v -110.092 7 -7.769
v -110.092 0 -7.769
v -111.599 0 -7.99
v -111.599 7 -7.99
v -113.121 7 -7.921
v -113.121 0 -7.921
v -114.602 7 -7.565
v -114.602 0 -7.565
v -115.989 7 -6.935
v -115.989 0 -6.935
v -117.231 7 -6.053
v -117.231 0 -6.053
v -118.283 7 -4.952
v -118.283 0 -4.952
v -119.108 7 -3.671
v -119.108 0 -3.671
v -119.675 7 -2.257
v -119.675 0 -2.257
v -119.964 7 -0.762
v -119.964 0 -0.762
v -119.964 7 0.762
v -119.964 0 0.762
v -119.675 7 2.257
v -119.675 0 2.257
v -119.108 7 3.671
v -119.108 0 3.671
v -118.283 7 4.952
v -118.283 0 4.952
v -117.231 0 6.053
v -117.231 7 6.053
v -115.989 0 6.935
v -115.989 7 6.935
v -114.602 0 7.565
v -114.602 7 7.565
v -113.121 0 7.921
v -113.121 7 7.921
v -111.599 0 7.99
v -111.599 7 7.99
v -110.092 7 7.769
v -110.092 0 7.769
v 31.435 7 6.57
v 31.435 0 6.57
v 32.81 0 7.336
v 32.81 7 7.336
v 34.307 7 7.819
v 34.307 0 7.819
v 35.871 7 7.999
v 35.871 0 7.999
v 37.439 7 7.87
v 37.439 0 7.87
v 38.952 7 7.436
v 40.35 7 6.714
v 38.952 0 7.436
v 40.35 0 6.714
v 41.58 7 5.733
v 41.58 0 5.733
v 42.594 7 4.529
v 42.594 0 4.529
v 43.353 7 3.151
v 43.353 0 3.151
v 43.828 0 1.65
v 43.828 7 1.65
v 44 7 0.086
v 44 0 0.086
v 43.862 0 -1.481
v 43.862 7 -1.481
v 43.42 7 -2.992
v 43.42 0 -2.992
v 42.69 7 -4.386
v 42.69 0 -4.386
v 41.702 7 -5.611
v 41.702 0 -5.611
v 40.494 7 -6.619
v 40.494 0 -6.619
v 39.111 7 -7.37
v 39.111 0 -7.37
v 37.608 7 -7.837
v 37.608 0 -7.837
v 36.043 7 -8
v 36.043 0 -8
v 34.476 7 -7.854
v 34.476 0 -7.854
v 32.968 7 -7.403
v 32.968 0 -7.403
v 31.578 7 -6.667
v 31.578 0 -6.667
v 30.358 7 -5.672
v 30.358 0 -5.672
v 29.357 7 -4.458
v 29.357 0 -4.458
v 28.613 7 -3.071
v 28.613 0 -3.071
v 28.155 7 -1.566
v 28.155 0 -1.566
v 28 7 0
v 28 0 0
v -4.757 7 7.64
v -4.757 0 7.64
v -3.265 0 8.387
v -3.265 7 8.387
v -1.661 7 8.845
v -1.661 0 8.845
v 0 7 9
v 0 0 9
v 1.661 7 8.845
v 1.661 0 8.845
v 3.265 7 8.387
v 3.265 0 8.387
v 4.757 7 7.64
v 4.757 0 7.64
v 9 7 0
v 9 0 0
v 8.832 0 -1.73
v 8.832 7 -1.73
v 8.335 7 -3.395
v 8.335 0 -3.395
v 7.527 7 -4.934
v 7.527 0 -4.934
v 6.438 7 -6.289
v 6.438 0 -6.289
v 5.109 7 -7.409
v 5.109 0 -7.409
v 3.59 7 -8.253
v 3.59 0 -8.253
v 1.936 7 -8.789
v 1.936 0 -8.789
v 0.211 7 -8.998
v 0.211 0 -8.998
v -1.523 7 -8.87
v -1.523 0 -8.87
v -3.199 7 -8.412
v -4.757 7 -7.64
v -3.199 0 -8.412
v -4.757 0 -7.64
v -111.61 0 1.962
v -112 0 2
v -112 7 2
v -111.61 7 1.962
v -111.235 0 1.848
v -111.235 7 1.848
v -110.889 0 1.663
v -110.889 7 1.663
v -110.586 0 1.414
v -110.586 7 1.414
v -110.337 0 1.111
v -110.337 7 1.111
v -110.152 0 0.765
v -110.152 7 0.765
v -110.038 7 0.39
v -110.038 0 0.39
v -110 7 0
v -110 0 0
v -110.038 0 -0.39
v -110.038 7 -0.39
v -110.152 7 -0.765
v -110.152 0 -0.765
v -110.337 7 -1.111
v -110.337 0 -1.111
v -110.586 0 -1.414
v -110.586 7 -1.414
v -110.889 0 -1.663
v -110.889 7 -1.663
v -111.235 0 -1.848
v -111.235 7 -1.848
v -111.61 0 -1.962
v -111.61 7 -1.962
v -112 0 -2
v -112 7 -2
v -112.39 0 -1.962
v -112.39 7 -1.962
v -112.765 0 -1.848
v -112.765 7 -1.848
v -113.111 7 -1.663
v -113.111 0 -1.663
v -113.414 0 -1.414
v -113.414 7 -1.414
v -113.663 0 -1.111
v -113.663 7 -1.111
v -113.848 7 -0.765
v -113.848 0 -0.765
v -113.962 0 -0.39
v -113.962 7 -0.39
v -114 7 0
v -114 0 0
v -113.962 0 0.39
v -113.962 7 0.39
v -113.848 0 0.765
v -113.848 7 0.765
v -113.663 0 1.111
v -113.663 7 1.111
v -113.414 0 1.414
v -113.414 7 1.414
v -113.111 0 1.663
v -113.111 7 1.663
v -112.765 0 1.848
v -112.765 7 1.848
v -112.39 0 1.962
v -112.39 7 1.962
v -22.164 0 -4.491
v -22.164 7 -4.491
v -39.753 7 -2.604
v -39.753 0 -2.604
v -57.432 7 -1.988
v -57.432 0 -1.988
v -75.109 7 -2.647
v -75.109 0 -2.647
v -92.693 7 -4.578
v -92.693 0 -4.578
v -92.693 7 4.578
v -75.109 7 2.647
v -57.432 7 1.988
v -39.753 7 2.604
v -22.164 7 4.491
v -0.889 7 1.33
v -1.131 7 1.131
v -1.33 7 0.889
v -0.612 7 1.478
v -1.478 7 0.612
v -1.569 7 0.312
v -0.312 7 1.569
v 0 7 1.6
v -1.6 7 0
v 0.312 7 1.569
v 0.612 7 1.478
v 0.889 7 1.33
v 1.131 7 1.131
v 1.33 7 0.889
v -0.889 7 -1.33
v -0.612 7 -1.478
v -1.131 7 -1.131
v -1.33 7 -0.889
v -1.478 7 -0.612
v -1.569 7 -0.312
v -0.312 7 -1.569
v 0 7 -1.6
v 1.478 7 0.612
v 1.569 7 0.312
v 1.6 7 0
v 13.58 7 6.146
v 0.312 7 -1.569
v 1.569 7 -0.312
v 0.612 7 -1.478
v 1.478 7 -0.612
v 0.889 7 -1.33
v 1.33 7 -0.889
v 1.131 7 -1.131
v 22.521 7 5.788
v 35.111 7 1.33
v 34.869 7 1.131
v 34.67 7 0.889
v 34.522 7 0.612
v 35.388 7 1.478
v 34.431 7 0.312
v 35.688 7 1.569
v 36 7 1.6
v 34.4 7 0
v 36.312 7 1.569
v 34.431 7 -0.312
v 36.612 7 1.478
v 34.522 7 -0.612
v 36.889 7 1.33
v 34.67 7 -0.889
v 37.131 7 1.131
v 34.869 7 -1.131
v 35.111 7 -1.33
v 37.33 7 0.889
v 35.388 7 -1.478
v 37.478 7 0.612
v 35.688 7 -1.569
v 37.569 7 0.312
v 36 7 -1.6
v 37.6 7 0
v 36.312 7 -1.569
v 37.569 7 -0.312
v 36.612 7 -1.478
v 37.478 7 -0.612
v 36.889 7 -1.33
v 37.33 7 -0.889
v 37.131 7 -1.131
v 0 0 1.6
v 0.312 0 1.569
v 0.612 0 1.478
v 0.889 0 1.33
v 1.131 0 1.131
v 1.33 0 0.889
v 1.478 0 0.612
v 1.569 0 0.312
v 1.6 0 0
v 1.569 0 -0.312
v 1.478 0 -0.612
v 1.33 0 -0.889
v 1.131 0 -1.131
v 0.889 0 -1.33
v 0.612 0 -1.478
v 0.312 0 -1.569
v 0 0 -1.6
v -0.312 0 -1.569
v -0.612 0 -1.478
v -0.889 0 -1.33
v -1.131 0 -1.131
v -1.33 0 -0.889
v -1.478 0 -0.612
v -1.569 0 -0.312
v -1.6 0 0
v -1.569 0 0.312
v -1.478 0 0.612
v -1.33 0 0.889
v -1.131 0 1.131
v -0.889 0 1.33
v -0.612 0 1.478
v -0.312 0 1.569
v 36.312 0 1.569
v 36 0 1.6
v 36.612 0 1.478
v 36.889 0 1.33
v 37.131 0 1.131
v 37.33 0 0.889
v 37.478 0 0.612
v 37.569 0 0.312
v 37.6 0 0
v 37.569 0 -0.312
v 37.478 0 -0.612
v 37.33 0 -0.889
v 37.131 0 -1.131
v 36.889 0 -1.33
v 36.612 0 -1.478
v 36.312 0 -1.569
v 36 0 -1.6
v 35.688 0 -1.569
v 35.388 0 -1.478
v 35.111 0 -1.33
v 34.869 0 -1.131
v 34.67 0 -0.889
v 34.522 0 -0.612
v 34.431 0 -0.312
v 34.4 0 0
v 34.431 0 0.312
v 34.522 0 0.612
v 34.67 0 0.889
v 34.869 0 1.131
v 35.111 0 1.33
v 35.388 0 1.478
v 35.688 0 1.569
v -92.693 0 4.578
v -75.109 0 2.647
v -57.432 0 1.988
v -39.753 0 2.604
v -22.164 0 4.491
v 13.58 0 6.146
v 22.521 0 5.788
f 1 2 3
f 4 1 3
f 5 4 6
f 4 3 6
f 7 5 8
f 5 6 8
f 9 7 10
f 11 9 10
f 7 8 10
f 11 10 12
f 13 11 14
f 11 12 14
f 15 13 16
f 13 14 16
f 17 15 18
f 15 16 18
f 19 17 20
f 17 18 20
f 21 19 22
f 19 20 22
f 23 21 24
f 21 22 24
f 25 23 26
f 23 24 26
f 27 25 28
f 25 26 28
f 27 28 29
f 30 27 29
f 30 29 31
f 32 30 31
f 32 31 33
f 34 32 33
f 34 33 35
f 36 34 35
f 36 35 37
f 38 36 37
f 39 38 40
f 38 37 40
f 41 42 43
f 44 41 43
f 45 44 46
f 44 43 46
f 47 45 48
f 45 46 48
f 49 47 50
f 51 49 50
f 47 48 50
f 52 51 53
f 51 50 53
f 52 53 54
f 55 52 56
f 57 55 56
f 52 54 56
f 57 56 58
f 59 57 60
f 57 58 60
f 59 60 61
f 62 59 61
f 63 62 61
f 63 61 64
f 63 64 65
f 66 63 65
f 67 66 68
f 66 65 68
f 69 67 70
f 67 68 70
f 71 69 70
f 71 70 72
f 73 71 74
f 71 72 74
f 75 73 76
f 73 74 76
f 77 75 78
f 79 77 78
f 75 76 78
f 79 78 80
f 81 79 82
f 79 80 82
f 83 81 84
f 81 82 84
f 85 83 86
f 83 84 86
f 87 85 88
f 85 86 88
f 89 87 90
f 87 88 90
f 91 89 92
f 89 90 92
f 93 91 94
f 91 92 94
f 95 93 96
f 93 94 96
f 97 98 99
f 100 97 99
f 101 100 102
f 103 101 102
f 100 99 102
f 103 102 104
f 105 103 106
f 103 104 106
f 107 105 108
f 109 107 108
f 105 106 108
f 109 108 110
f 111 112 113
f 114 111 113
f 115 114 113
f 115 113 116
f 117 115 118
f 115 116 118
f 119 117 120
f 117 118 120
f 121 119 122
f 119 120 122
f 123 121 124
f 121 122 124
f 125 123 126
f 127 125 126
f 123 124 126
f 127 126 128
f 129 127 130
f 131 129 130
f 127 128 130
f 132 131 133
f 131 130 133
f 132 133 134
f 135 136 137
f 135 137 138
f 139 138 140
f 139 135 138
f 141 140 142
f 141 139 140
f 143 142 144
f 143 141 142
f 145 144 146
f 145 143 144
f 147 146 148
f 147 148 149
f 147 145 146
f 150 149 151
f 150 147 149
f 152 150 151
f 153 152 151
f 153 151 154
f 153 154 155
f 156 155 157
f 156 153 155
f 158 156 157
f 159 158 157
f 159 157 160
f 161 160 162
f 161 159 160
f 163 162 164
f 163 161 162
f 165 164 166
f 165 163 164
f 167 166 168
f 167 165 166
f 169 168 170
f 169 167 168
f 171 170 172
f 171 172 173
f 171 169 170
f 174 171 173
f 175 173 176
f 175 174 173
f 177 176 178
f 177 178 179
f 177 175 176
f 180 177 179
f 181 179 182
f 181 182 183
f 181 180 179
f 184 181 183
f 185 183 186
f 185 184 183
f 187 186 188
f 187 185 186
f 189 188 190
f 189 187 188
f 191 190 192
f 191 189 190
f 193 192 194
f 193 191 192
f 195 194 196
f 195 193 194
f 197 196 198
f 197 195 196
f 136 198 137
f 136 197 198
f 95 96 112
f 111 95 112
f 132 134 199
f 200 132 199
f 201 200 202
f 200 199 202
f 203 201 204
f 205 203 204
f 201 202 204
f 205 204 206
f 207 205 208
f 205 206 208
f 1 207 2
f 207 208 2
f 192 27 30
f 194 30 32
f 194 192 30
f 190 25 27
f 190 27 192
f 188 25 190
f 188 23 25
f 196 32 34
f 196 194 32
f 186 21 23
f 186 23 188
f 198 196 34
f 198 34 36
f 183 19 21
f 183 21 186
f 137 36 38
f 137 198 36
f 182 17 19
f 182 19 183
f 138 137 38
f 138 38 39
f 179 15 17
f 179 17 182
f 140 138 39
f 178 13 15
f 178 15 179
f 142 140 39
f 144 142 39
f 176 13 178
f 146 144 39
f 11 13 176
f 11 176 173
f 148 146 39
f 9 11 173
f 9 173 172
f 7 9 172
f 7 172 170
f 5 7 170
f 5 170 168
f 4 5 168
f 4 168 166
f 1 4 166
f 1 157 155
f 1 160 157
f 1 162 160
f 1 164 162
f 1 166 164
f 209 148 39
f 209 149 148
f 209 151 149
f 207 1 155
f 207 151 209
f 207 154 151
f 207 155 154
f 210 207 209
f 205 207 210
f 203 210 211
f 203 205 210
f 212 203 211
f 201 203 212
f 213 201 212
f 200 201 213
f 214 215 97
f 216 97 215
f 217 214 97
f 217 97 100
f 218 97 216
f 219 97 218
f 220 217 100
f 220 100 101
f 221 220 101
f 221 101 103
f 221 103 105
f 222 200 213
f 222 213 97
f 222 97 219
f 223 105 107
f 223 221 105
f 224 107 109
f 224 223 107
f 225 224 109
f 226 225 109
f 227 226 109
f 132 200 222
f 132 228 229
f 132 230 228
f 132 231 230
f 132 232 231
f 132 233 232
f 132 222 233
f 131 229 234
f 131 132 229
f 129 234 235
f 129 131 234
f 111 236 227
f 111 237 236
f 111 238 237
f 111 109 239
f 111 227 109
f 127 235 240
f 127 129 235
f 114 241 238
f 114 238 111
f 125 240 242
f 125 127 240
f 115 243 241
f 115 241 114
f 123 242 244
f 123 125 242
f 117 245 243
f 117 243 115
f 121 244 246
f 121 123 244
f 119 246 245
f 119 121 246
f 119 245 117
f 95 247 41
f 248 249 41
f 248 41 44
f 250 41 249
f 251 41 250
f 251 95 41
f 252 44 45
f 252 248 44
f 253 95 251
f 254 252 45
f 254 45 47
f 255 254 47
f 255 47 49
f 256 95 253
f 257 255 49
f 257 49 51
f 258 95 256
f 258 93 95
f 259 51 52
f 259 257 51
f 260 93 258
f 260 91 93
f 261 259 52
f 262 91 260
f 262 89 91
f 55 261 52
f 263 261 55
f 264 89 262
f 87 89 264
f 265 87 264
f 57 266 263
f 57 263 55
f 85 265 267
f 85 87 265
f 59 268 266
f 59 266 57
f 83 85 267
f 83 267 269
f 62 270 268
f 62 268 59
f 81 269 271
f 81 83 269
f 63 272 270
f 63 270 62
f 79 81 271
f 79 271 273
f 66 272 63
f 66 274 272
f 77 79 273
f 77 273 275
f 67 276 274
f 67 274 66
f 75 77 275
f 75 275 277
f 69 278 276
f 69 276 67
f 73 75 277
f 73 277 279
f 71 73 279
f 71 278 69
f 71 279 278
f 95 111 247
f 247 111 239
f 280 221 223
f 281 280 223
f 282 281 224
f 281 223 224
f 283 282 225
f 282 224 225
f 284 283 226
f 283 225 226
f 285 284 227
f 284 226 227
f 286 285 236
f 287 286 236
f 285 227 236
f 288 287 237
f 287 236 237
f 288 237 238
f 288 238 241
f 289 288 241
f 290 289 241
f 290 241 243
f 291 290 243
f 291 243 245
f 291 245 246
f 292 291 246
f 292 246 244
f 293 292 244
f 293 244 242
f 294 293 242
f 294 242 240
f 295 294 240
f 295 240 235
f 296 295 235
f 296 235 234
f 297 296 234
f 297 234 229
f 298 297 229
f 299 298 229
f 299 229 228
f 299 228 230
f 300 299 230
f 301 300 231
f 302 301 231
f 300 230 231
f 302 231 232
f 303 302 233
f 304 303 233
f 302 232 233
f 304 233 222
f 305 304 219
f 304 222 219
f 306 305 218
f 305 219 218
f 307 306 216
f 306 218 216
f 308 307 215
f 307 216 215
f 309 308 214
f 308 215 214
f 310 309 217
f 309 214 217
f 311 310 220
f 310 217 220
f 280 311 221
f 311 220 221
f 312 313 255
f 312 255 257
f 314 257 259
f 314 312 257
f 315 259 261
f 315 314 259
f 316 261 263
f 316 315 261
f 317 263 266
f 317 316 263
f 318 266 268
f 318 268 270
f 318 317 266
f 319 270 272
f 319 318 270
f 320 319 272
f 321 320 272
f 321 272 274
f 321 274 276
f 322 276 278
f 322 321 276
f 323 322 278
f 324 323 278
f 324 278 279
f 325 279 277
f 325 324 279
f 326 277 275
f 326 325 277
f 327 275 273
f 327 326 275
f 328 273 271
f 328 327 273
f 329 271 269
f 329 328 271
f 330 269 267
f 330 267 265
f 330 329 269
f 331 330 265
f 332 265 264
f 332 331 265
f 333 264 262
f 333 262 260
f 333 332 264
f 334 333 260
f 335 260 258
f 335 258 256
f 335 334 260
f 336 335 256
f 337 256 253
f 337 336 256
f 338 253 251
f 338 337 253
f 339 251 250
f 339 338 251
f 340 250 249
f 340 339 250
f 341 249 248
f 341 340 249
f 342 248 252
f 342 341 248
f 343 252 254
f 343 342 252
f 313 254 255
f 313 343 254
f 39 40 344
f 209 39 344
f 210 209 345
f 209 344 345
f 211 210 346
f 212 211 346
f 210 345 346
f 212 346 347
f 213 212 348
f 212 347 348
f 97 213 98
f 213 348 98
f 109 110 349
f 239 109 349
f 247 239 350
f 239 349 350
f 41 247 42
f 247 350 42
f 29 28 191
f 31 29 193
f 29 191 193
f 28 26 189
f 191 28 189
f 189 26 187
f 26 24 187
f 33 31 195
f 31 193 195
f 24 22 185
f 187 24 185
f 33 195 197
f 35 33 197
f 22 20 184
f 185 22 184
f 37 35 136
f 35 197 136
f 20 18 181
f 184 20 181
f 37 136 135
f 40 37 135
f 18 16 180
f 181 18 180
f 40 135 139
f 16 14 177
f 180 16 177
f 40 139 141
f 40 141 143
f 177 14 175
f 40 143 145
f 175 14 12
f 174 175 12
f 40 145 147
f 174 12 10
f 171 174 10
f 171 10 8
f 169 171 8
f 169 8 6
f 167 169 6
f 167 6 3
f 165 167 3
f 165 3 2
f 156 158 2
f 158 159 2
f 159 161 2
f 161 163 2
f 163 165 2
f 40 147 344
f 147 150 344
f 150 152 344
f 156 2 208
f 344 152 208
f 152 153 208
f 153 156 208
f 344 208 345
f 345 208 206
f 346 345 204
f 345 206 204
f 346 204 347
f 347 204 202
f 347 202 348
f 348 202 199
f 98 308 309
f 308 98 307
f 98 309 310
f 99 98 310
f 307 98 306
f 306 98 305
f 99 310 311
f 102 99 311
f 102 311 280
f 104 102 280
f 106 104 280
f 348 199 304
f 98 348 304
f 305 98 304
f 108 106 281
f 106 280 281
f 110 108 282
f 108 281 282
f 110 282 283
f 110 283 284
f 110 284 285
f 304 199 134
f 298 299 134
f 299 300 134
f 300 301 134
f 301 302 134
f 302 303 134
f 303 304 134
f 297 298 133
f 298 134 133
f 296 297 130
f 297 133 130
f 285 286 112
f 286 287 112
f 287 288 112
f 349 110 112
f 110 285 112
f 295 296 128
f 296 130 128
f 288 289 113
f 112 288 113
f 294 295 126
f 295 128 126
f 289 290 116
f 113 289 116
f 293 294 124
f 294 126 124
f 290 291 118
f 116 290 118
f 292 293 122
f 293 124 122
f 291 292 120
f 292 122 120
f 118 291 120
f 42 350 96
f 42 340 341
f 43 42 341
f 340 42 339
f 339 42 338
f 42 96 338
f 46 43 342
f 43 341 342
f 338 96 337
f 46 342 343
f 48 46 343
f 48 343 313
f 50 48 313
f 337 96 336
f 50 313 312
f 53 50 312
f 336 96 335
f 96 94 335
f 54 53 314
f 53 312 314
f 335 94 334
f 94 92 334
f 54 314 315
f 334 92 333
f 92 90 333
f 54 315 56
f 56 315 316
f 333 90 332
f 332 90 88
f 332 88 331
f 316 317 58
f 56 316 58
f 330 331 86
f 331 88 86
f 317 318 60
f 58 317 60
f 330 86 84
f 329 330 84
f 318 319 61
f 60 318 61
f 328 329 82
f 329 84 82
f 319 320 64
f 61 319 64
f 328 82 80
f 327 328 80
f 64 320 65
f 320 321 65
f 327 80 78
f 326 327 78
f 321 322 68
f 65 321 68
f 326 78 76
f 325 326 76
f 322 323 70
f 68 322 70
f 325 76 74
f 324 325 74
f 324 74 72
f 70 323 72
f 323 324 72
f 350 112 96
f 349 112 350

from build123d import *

# Parameters (mm, degrees)
SKETCH1_R           = 2
SKETCH1_R_2         = 1.6
BOSS_EXTRUDE1_DEPTH = 7
SKETCH4_R           = 1.6
CUT_EXTRUDE1_DEPTH  = 10


with BuildPart() as part:
    # Sketch1 → Boss-Extrude1 (new body)
    with BuildSketch(Plane(origin=(0, 0, 0), x_dir=(1, 0, 0), z_dir=(0, 1, 0))):
        with BuildLine():
            ThreePointArc((-110.092216302, 7.769193096), (-120, 0), (-110.092216302, -7.769193096))
            ThreePointArc((-110.092216302, -7.769193096), (-57.431509927, -1.988156982), (-4.756803809, -7.640210568))
            ThreePointArc((-4.756803809, -7.640210568), (0, -9), (4.756803809, -7.640210568))
            ThreePointArc((4.756803809, -7.640210568), (18.044616959, -5.824262713), (31.43520243, -6.569826721))
            ThreePointArc((31.43520243, -6.569826721), (43.089371642, 3.706859819), (28, 0))
            Line((28, 0), (9, 0))
            ThreePointArc((9, 0), (4.369711988, 7.868012274), (-4.756803809, 7.640210568))
            ThreePointArc((-4.756803809, 7.640210568), (-57.431509927, 1.988156982), (-110.092216302, 7.769193096))
        make_face()
        with Locations(Location((-112, 0, 0), (0, 0, 270))):
            Circle(SKETCH1_R, mode=Mode.SUBTRACT)
        with Locations(Location((36, 0, 0), (0, 0, 270))):
            Circle(SKETCH1_R_2, mode=Mode.SUBTRACT)
    extrude(amount=BOSS_EXTRUDE1_DEPTH)

    # Sketch4 → Cut-Extrude1 (cut)
    with BuildSketch(Plane(origin=(0, 7, 0), x_dir=(1, 0, 0), z_dir=(0, 1, 0))):
        with Locations(Location((0, 0, 0), (0, 0, 270))):
            Circle(SKETCH4_R)
    extrude(amount=-CUT_EXTRUDE1_DEPTH, mode=Mode.SUBTRACT)


solid = part.part
